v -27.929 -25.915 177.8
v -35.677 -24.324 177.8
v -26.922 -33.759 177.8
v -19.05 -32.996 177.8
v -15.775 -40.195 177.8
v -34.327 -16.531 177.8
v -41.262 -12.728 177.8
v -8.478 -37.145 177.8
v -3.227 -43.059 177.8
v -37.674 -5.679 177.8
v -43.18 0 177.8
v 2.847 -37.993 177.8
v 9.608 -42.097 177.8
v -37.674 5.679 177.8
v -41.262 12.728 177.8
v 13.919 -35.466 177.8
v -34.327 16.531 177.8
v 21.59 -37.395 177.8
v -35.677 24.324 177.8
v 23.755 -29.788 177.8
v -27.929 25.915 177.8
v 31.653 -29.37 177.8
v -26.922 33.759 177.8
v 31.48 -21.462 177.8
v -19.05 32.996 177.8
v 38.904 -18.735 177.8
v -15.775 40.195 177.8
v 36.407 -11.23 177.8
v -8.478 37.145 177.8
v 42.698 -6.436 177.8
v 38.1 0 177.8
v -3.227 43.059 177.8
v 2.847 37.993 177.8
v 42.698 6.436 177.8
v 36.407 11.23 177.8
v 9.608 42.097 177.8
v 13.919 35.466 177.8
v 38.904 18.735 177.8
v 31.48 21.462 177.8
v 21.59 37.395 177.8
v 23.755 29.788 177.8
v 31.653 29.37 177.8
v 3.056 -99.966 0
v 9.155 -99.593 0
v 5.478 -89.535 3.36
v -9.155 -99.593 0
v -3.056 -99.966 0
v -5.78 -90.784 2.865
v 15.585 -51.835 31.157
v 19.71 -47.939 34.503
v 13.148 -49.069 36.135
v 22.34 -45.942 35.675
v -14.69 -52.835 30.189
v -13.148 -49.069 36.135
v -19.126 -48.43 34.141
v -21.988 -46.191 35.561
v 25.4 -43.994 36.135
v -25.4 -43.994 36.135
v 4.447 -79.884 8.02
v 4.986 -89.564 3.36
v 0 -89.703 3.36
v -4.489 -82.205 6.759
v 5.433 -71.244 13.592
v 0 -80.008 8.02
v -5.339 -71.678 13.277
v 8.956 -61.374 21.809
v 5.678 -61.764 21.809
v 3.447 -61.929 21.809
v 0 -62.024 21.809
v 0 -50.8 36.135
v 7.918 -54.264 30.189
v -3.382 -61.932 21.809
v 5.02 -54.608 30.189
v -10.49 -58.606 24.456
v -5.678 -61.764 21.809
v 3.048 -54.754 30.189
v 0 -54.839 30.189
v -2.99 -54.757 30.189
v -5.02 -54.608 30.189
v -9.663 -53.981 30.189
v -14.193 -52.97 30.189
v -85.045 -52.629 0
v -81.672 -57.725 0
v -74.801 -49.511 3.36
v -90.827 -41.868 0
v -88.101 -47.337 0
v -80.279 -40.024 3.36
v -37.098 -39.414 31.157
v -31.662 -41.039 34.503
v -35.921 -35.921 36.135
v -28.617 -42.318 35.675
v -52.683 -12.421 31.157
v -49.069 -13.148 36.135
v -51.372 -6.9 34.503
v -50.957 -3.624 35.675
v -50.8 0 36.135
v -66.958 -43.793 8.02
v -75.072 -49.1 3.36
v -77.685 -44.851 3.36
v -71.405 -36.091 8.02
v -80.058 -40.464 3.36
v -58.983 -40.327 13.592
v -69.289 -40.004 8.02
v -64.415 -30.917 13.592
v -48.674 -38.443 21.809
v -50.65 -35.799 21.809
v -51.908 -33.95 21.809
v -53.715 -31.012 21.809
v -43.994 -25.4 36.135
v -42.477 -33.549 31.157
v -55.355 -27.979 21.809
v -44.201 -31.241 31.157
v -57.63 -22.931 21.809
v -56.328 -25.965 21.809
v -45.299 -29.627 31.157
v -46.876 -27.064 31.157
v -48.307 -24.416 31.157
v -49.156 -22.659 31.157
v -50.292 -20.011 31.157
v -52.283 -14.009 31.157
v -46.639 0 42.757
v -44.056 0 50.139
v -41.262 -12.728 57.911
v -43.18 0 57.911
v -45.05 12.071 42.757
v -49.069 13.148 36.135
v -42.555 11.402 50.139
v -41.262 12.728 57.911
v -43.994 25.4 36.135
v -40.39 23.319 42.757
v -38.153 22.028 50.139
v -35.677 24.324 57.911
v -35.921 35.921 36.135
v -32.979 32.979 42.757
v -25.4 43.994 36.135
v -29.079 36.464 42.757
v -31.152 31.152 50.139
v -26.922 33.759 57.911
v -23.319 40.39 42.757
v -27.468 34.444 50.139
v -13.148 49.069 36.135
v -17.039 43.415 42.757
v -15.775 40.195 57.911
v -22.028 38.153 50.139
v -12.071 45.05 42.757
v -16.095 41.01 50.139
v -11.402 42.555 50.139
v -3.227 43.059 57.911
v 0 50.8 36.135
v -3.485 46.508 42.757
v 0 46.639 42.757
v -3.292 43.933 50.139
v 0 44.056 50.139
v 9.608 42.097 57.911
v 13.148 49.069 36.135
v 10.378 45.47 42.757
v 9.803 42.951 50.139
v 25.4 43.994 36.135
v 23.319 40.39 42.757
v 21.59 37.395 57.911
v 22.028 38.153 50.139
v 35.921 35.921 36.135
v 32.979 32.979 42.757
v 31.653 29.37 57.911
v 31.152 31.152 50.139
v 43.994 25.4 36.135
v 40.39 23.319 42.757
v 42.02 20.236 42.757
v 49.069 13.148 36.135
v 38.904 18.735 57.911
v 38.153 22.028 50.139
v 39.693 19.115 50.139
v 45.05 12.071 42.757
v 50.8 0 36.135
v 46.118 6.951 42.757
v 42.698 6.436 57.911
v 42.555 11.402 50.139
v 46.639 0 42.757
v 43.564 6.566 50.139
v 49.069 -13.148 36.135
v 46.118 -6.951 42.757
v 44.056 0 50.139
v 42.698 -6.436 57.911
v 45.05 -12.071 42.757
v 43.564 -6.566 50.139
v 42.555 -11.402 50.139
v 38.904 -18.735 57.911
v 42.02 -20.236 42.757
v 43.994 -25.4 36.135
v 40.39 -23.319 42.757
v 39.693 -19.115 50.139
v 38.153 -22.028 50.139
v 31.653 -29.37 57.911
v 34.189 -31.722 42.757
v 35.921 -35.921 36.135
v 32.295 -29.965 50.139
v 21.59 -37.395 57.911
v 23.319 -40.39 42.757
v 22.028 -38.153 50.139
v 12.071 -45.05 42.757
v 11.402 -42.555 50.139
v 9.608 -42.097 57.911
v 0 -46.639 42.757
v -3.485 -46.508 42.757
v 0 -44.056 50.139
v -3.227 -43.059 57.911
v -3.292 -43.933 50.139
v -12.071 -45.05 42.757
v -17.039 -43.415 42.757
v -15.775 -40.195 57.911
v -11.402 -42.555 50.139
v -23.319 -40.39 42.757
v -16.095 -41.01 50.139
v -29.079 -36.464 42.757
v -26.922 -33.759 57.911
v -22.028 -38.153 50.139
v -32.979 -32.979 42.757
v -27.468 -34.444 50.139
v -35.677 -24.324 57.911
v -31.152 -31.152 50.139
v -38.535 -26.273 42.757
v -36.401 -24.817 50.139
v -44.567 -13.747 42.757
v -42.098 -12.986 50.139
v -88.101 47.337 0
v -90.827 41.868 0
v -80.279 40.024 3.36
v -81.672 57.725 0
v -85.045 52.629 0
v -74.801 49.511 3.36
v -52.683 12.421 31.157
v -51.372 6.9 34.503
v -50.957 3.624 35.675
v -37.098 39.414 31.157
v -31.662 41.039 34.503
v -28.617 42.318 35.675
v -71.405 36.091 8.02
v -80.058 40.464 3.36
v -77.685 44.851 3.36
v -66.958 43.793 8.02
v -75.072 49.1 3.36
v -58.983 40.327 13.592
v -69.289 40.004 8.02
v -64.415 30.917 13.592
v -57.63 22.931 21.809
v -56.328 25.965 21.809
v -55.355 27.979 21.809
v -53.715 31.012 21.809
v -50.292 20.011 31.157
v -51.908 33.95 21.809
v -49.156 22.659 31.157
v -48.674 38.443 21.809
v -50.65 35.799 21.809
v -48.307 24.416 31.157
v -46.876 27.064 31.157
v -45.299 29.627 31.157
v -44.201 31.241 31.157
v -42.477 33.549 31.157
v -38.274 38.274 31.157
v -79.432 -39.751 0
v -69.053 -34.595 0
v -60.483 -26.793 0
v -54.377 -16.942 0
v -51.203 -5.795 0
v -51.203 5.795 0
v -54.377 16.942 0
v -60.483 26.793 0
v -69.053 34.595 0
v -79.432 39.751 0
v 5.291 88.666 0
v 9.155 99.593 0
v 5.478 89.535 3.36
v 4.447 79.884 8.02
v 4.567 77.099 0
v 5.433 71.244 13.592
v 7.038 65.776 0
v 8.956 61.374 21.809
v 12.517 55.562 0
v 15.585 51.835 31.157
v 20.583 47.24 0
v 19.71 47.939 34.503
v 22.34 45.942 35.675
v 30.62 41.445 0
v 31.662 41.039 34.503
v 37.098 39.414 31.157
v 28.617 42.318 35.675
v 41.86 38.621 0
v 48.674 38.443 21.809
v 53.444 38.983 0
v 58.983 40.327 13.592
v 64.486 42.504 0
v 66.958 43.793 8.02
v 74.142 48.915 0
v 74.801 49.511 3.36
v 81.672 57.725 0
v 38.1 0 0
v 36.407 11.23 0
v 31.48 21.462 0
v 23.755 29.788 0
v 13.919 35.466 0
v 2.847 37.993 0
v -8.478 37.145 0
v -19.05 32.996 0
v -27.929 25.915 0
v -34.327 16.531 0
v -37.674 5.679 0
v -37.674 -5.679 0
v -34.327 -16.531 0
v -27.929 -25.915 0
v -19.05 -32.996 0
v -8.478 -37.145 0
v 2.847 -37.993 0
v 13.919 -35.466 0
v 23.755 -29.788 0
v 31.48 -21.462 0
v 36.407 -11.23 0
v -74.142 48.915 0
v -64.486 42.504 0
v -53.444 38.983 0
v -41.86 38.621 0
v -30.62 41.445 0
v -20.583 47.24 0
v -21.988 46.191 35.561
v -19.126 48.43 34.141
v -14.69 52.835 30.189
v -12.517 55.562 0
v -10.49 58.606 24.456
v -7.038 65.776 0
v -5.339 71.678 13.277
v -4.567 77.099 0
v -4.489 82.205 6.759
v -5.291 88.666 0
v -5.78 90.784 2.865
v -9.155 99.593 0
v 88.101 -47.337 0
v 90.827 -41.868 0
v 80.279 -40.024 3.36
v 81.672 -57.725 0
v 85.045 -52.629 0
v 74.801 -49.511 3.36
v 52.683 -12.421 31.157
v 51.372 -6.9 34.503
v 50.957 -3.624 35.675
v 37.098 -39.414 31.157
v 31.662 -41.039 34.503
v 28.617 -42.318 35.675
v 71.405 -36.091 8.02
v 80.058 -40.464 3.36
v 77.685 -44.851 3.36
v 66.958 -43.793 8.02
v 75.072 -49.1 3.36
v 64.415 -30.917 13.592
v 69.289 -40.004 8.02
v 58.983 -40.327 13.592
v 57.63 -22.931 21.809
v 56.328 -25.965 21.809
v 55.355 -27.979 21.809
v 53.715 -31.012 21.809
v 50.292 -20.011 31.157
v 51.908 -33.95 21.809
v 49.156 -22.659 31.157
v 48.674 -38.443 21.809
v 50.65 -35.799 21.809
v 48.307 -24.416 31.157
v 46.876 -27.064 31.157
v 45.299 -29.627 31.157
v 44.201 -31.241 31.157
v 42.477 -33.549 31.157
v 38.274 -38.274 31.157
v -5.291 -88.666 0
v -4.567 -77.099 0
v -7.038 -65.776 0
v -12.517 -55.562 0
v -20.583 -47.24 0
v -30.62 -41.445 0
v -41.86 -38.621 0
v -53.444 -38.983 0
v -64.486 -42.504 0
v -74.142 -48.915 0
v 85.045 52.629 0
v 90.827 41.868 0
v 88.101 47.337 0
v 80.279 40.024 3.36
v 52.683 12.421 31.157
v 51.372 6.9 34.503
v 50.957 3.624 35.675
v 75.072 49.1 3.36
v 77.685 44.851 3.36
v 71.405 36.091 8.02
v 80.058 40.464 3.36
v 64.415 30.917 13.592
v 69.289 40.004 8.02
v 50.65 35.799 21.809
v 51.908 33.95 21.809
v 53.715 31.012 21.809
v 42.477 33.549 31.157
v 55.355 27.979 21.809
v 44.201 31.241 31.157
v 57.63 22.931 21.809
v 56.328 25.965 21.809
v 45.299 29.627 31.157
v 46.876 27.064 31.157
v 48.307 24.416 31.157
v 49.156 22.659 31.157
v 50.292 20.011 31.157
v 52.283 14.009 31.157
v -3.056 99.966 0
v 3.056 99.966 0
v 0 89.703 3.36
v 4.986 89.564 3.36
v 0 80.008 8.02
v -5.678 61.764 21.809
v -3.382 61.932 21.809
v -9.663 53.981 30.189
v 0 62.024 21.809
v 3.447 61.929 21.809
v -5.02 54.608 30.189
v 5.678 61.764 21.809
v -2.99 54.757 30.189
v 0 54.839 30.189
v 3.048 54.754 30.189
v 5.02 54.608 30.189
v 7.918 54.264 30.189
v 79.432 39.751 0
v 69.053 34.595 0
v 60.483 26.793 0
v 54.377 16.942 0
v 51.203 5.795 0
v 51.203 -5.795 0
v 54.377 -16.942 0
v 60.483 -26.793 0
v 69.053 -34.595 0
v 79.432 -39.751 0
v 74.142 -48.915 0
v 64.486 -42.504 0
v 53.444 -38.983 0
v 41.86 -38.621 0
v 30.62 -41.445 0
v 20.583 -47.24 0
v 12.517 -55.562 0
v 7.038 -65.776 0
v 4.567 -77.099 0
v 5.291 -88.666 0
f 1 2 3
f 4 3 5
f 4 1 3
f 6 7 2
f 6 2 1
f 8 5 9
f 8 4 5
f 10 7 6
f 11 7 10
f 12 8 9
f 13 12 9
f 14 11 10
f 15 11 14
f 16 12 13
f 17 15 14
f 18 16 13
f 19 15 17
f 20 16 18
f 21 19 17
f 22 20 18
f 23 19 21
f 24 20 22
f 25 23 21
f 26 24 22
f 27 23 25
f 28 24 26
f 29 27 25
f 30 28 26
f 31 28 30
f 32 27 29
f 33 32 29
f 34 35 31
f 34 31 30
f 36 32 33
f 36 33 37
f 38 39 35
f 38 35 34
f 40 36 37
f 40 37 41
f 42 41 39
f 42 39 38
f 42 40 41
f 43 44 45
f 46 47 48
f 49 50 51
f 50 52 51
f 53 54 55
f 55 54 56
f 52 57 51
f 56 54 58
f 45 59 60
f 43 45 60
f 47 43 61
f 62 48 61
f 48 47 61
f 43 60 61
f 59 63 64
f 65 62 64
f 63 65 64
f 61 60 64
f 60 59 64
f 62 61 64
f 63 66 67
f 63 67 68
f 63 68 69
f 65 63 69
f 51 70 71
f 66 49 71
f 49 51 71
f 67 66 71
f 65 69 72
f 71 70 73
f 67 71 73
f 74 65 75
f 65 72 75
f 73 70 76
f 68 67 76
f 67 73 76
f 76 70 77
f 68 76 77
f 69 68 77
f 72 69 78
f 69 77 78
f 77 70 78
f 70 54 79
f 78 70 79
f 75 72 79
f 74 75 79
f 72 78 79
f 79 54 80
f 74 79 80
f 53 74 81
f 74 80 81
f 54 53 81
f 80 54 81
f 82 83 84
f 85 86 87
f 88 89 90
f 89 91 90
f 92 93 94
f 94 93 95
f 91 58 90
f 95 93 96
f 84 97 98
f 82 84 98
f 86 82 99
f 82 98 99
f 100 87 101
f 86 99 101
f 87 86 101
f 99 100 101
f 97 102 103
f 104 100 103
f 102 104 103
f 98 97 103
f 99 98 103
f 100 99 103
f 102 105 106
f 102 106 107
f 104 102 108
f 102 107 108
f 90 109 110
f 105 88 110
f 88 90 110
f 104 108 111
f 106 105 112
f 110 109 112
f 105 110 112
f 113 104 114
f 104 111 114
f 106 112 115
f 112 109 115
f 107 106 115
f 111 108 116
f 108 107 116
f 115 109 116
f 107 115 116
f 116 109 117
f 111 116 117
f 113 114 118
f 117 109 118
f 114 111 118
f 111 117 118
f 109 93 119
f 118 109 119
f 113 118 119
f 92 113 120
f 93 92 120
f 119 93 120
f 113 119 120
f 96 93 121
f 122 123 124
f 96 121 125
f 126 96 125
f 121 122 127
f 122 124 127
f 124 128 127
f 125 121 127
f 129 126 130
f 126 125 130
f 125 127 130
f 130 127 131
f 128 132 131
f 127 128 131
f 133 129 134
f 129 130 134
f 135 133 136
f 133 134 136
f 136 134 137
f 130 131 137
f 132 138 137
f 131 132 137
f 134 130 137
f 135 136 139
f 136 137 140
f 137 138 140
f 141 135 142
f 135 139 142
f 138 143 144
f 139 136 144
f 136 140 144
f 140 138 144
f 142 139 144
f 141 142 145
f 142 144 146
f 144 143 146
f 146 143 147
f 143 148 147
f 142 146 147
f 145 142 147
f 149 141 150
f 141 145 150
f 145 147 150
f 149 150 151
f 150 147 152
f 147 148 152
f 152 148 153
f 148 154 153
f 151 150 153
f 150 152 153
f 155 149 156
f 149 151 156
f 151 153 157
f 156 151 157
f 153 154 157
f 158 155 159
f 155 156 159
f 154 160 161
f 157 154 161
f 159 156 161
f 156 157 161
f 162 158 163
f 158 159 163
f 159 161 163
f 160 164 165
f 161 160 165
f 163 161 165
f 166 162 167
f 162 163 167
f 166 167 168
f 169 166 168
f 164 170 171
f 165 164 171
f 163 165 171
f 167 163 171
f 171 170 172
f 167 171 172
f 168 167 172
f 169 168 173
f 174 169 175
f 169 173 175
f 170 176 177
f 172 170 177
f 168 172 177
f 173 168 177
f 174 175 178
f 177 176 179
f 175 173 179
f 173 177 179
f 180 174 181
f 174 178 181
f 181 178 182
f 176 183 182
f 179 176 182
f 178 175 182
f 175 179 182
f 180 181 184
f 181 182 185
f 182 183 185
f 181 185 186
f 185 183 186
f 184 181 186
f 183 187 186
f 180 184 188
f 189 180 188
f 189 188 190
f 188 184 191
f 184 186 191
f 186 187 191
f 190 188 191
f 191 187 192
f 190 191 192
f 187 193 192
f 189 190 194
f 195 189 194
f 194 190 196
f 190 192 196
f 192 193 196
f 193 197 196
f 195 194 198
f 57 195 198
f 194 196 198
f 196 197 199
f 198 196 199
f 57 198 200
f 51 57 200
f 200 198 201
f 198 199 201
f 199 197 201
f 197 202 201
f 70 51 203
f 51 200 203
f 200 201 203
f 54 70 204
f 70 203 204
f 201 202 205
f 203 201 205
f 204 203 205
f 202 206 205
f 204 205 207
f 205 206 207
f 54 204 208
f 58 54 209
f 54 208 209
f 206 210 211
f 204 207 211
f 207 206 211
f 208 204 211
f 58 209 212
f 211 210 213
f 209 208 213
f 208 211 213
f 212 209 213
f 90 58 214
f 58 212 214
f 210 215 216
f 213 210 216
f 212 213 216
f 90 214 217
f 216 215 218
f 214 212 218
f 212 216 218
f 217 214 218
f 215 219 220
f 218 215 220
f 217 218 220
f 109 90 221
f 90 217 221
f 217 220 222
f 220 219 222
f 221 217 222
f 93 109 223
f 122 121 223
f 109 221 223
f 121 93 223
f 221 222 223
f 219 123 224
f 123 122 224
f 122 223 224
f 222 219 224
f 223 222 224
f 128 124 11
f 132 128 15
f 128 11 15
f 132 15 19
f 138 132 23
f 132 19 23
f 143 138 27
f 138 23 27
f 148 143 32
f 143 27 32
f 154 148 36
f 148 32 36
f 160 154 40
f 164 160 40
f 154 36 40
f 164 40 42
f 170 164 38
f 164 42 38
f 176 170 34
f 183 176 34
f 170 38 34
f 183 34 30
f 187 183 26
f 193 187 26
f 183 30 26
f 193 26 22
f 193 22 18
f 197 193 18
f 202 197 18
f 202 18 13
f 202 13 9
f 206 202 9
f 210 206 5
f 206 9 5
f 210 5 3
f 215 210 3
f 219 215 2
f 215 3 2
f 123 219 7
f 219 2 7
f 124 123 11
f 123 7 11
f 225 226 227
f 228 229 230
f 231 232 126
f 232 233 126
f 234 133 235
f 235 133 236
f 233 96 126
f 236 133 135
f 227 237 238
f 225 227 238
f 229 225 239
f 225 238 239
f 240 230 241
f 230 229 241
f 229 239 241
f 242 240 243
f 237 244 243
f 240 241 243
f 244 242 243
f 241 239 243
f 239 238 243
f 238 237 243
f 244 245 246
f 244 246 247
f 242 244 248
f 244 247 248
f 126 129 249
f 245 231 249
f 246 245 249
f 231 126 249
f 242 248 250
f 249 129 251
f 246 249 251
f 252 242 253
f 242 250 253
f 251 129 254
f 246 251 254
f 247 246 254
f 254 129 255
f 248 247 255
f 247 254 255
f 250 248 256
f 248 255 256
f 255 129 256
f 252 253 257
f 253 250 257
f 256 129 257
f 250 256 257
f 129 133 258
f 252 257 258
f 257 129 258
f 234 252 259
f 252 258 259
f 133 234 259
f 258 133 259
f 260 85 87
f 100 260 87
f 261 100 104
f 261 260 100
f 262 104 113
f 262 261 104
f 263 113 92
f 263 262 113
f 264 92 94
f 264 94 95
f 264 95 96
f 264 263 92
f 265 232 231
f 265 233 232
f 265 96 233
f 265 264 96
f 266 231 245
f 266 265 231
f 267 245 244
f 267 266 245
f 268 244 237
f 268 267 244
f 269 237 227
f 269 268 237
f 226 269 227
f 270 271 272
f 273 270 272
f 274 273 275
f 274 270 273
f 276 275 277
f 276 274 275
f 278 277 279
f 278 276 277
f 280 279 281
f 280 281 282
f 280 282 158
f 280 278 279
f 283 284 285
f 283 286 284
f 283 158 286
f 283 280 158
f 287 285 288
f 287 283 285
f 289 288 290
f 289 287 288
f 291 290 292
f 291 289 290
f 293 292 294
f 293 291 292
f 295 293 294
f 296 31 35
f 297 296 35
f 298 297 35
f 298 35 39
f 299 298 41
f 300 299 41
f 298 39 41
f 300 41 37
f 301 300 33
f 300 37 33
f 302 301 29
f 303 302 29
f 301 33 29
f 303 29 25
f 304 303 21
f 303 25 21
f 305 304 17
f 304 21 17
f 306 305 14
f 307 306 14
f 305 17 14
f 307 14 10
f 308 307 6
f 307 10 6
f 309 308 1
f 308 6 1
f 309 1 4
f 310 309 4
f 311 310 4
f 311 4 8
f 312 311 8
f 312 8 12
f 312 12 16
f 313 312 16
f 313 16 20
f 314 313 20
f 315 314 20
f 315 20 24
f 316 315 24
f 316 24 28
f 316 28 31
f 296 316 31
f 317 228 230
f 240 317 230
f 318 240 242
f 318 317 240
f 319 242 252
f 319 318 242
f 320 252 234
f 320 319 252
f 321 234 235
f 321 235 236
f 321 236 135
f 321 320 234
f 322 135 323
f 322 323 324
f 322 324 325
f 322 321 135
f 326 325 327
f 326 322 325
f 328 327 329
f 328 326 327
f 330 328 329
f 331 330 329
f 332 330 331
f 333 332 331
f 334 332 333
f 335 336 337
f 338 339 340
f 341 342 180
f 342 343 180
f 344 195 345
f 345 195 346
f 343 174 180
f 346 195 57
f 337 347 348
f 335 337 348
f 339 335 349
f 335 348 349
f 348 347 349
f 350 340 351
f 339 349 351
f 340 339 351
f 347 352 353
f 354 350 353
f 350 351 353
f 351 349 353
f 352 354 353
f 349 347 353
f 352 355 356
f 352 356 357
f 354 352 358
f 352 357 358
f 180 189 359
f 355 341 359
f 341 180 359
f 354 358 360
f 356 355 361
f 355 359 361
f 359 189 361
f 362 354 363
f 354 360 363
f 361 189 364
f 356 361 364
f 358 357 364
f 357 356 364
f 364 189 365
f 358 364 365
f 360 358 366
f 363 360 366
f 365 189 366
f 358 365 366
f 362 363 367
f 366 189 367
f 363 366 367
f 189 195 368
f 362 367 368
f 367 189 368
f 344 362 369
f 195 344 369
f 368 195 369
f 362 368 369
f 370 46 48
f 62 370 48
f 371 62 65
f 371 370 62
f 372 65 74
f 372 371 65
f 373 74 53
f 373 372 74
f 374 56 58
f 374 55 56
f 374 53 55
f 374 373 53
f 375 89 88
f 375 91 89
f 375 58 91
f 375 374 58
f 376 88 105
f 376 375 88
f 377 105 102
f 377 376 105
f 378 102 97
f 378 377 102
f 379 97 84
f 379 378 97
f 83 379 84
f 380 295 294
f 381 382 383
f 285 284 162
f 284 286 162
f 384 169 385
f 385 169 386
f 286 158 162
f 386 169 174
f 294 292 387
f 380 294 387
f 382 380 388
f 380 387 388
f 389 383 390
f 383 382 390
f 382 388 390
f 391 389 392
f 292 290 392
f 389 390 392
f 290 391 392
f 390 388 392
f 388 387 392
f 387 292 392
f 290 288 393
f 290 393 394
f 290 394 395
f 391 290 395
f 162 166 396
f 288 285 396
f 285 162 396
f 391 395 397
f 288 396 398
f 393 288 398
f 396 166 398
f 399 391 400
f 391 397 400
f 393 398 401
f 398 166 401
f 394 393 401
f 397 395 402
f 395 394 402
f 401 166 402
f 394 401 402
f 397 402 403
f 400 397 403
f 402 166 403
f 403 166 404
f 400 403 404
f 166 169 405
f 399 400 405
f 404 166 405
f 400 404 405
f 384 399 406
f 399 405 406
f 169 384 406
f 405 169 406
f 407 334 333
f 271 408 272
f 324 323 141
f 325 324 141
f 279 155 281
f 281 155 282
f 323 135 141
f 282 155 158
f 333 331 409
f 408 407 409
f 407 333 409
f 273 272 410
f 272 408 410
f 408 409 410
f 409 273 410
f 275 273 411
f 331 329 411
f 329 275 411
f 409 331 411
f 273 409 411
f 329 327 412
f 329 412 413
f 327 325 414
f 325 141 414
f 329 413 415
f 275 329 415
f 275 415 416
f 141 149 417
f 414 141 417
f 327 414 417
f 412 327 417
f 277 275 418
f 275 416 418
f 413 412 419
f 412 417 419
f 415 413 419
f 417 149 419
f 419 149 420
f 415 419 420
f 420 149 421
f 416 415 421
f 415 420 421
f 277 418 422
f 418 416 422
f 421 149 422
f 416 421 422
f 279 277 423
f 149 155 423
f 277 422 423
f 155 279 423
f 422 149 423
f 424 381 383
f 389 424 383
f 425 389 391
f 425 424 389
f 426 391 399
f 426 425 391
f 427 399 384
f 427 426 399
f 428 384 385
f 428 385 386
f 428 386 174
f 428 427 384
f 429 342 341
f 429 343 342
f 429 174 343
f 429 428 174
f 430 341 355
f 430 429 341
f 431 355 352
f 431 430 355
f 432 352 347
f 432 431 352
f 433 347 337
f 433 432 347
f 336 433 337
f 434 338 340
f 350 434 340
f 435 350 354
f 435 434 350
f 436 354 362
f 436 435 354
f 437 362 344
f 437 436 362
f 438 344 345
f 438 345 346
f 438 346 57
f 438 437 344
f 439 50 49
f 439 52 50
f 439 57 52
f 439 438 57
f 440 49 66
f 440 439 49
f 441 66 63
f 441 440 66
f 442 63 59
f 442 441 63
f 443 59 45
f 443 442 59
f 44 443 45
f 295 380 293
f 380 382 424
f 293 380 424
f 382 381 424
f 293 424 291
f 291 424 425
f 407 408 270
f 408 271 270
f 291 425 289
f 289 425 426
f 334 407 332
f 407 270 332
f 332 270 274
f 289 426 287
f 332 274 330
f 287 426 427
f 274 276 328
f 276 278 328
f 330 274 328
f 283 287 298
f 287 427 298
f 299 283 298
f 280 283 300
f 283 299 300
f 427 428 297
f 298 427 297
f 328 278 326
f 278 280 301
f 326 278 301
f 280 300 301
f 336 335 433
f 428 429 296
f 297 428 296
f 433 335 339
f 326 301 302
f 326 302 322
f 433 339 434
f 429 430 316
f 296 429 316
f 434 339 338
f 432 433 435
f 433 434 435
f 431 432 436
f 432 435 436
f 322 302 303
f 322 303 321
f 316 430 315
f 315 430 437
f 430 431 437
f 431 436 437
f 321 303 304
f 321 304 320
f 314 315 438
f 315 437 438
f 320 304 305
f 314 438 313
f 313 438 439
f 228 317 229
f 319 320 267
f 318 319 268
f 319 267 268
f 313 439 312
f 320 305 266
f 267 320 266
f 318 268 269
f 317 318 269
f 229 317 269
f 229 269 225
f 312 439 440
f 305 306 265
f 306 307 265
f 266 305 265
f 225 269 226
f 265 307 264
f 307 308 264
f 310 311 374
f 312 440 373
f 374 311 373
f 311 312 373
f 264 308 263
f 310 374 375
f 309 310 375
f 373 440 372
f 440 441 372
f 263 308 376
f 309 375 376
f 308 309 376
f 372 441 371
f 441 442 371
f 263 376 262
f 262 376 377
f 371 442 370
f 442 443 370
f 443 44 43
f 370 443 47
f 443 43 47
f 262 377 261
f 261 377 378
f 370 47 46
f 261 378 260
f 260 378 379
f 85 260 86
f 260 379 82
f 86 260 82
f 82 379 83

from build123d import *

# Parameters (mm, degrees)
F0_R     = 50.8
F2_DEPTH = 177.8
F3_R     = 38.1
F4_DEPTH = 177.801
F1_R     = 41.91
F7_DEPTH = 177.801


with BuildPart() as f2:
    # F0 (on Top) → F2 (new body)
    with BuildSketch(Plane.XY):
        Circle(F0_R)
    extrude(amount=F2_DEPTH)

    # F3 (on face) → F4 (cut, through all)
    with BuildSketch(Plane.XY.offset(177.8)):
        Circle(F3_R)
    extrude(amount=-F4_DEPTH, mode=Mode.SUBTRACT)

    # F5 (on Front) → F6 (revolve)
    with BuildSketch(Plane.XZ):
        with BuildLine():
            ThreePointArc((100.0125, 0), (70.9357679727, 13.9783849732), (49.5876034492, 38.167379647))
            Line((49.5876034492, 38.167379647), (49.5876034492, 0))
            Line((49.5876034492, 0), (100.0125, 0))
        make_face()
    revolve(axis=Axis((0, 0, 0), (0, 0, -1)))

    # F1 (on Top) → F7 (cut, through all)
    with BuildSketch(Plane.XY):
        with Locations((-92.71, 0)):
            Circle(F1_R)
        with Locations((-46.355, -80.2892151849)):
            Circle(F1_R)
        with Locations((46.355, -80.2892151849)):
            Circle(F1_R)
        with Locations((92.71, 0)):
            Circle(F1_R)
        with Locations((46.355, 80.2892151849)):
            Circle(F1_R)
        with Locations((-46.355, 80.2892151849)):
            Circle(F1_R)
    extrude(amount=F7_DEPTH, mode=Mode.SUBTRACT)

    # F8 (on Front) → F9 (revolve, cut)
    with BuildSketch(Plane.XZ):
        with BuildLine():
            Line((-50.8, 177.8), (-50.8, 36.134957756))
            ThreePointArc((-50.8, 36.134957756), (-45.1399977249, 46.3755737202), (-43.18, 57.9109215693))
            Line((-43.18, 57.9109215693), (-43.18, 177.8))
            Line((-43.18, 177.8), (-50.8, 177.8))
        make_face()
    revolve(axis=Axis((0, 0, 177.8), (0, 0, -1)), mode=Mode.SUBTRACT)


solid = f2.part
